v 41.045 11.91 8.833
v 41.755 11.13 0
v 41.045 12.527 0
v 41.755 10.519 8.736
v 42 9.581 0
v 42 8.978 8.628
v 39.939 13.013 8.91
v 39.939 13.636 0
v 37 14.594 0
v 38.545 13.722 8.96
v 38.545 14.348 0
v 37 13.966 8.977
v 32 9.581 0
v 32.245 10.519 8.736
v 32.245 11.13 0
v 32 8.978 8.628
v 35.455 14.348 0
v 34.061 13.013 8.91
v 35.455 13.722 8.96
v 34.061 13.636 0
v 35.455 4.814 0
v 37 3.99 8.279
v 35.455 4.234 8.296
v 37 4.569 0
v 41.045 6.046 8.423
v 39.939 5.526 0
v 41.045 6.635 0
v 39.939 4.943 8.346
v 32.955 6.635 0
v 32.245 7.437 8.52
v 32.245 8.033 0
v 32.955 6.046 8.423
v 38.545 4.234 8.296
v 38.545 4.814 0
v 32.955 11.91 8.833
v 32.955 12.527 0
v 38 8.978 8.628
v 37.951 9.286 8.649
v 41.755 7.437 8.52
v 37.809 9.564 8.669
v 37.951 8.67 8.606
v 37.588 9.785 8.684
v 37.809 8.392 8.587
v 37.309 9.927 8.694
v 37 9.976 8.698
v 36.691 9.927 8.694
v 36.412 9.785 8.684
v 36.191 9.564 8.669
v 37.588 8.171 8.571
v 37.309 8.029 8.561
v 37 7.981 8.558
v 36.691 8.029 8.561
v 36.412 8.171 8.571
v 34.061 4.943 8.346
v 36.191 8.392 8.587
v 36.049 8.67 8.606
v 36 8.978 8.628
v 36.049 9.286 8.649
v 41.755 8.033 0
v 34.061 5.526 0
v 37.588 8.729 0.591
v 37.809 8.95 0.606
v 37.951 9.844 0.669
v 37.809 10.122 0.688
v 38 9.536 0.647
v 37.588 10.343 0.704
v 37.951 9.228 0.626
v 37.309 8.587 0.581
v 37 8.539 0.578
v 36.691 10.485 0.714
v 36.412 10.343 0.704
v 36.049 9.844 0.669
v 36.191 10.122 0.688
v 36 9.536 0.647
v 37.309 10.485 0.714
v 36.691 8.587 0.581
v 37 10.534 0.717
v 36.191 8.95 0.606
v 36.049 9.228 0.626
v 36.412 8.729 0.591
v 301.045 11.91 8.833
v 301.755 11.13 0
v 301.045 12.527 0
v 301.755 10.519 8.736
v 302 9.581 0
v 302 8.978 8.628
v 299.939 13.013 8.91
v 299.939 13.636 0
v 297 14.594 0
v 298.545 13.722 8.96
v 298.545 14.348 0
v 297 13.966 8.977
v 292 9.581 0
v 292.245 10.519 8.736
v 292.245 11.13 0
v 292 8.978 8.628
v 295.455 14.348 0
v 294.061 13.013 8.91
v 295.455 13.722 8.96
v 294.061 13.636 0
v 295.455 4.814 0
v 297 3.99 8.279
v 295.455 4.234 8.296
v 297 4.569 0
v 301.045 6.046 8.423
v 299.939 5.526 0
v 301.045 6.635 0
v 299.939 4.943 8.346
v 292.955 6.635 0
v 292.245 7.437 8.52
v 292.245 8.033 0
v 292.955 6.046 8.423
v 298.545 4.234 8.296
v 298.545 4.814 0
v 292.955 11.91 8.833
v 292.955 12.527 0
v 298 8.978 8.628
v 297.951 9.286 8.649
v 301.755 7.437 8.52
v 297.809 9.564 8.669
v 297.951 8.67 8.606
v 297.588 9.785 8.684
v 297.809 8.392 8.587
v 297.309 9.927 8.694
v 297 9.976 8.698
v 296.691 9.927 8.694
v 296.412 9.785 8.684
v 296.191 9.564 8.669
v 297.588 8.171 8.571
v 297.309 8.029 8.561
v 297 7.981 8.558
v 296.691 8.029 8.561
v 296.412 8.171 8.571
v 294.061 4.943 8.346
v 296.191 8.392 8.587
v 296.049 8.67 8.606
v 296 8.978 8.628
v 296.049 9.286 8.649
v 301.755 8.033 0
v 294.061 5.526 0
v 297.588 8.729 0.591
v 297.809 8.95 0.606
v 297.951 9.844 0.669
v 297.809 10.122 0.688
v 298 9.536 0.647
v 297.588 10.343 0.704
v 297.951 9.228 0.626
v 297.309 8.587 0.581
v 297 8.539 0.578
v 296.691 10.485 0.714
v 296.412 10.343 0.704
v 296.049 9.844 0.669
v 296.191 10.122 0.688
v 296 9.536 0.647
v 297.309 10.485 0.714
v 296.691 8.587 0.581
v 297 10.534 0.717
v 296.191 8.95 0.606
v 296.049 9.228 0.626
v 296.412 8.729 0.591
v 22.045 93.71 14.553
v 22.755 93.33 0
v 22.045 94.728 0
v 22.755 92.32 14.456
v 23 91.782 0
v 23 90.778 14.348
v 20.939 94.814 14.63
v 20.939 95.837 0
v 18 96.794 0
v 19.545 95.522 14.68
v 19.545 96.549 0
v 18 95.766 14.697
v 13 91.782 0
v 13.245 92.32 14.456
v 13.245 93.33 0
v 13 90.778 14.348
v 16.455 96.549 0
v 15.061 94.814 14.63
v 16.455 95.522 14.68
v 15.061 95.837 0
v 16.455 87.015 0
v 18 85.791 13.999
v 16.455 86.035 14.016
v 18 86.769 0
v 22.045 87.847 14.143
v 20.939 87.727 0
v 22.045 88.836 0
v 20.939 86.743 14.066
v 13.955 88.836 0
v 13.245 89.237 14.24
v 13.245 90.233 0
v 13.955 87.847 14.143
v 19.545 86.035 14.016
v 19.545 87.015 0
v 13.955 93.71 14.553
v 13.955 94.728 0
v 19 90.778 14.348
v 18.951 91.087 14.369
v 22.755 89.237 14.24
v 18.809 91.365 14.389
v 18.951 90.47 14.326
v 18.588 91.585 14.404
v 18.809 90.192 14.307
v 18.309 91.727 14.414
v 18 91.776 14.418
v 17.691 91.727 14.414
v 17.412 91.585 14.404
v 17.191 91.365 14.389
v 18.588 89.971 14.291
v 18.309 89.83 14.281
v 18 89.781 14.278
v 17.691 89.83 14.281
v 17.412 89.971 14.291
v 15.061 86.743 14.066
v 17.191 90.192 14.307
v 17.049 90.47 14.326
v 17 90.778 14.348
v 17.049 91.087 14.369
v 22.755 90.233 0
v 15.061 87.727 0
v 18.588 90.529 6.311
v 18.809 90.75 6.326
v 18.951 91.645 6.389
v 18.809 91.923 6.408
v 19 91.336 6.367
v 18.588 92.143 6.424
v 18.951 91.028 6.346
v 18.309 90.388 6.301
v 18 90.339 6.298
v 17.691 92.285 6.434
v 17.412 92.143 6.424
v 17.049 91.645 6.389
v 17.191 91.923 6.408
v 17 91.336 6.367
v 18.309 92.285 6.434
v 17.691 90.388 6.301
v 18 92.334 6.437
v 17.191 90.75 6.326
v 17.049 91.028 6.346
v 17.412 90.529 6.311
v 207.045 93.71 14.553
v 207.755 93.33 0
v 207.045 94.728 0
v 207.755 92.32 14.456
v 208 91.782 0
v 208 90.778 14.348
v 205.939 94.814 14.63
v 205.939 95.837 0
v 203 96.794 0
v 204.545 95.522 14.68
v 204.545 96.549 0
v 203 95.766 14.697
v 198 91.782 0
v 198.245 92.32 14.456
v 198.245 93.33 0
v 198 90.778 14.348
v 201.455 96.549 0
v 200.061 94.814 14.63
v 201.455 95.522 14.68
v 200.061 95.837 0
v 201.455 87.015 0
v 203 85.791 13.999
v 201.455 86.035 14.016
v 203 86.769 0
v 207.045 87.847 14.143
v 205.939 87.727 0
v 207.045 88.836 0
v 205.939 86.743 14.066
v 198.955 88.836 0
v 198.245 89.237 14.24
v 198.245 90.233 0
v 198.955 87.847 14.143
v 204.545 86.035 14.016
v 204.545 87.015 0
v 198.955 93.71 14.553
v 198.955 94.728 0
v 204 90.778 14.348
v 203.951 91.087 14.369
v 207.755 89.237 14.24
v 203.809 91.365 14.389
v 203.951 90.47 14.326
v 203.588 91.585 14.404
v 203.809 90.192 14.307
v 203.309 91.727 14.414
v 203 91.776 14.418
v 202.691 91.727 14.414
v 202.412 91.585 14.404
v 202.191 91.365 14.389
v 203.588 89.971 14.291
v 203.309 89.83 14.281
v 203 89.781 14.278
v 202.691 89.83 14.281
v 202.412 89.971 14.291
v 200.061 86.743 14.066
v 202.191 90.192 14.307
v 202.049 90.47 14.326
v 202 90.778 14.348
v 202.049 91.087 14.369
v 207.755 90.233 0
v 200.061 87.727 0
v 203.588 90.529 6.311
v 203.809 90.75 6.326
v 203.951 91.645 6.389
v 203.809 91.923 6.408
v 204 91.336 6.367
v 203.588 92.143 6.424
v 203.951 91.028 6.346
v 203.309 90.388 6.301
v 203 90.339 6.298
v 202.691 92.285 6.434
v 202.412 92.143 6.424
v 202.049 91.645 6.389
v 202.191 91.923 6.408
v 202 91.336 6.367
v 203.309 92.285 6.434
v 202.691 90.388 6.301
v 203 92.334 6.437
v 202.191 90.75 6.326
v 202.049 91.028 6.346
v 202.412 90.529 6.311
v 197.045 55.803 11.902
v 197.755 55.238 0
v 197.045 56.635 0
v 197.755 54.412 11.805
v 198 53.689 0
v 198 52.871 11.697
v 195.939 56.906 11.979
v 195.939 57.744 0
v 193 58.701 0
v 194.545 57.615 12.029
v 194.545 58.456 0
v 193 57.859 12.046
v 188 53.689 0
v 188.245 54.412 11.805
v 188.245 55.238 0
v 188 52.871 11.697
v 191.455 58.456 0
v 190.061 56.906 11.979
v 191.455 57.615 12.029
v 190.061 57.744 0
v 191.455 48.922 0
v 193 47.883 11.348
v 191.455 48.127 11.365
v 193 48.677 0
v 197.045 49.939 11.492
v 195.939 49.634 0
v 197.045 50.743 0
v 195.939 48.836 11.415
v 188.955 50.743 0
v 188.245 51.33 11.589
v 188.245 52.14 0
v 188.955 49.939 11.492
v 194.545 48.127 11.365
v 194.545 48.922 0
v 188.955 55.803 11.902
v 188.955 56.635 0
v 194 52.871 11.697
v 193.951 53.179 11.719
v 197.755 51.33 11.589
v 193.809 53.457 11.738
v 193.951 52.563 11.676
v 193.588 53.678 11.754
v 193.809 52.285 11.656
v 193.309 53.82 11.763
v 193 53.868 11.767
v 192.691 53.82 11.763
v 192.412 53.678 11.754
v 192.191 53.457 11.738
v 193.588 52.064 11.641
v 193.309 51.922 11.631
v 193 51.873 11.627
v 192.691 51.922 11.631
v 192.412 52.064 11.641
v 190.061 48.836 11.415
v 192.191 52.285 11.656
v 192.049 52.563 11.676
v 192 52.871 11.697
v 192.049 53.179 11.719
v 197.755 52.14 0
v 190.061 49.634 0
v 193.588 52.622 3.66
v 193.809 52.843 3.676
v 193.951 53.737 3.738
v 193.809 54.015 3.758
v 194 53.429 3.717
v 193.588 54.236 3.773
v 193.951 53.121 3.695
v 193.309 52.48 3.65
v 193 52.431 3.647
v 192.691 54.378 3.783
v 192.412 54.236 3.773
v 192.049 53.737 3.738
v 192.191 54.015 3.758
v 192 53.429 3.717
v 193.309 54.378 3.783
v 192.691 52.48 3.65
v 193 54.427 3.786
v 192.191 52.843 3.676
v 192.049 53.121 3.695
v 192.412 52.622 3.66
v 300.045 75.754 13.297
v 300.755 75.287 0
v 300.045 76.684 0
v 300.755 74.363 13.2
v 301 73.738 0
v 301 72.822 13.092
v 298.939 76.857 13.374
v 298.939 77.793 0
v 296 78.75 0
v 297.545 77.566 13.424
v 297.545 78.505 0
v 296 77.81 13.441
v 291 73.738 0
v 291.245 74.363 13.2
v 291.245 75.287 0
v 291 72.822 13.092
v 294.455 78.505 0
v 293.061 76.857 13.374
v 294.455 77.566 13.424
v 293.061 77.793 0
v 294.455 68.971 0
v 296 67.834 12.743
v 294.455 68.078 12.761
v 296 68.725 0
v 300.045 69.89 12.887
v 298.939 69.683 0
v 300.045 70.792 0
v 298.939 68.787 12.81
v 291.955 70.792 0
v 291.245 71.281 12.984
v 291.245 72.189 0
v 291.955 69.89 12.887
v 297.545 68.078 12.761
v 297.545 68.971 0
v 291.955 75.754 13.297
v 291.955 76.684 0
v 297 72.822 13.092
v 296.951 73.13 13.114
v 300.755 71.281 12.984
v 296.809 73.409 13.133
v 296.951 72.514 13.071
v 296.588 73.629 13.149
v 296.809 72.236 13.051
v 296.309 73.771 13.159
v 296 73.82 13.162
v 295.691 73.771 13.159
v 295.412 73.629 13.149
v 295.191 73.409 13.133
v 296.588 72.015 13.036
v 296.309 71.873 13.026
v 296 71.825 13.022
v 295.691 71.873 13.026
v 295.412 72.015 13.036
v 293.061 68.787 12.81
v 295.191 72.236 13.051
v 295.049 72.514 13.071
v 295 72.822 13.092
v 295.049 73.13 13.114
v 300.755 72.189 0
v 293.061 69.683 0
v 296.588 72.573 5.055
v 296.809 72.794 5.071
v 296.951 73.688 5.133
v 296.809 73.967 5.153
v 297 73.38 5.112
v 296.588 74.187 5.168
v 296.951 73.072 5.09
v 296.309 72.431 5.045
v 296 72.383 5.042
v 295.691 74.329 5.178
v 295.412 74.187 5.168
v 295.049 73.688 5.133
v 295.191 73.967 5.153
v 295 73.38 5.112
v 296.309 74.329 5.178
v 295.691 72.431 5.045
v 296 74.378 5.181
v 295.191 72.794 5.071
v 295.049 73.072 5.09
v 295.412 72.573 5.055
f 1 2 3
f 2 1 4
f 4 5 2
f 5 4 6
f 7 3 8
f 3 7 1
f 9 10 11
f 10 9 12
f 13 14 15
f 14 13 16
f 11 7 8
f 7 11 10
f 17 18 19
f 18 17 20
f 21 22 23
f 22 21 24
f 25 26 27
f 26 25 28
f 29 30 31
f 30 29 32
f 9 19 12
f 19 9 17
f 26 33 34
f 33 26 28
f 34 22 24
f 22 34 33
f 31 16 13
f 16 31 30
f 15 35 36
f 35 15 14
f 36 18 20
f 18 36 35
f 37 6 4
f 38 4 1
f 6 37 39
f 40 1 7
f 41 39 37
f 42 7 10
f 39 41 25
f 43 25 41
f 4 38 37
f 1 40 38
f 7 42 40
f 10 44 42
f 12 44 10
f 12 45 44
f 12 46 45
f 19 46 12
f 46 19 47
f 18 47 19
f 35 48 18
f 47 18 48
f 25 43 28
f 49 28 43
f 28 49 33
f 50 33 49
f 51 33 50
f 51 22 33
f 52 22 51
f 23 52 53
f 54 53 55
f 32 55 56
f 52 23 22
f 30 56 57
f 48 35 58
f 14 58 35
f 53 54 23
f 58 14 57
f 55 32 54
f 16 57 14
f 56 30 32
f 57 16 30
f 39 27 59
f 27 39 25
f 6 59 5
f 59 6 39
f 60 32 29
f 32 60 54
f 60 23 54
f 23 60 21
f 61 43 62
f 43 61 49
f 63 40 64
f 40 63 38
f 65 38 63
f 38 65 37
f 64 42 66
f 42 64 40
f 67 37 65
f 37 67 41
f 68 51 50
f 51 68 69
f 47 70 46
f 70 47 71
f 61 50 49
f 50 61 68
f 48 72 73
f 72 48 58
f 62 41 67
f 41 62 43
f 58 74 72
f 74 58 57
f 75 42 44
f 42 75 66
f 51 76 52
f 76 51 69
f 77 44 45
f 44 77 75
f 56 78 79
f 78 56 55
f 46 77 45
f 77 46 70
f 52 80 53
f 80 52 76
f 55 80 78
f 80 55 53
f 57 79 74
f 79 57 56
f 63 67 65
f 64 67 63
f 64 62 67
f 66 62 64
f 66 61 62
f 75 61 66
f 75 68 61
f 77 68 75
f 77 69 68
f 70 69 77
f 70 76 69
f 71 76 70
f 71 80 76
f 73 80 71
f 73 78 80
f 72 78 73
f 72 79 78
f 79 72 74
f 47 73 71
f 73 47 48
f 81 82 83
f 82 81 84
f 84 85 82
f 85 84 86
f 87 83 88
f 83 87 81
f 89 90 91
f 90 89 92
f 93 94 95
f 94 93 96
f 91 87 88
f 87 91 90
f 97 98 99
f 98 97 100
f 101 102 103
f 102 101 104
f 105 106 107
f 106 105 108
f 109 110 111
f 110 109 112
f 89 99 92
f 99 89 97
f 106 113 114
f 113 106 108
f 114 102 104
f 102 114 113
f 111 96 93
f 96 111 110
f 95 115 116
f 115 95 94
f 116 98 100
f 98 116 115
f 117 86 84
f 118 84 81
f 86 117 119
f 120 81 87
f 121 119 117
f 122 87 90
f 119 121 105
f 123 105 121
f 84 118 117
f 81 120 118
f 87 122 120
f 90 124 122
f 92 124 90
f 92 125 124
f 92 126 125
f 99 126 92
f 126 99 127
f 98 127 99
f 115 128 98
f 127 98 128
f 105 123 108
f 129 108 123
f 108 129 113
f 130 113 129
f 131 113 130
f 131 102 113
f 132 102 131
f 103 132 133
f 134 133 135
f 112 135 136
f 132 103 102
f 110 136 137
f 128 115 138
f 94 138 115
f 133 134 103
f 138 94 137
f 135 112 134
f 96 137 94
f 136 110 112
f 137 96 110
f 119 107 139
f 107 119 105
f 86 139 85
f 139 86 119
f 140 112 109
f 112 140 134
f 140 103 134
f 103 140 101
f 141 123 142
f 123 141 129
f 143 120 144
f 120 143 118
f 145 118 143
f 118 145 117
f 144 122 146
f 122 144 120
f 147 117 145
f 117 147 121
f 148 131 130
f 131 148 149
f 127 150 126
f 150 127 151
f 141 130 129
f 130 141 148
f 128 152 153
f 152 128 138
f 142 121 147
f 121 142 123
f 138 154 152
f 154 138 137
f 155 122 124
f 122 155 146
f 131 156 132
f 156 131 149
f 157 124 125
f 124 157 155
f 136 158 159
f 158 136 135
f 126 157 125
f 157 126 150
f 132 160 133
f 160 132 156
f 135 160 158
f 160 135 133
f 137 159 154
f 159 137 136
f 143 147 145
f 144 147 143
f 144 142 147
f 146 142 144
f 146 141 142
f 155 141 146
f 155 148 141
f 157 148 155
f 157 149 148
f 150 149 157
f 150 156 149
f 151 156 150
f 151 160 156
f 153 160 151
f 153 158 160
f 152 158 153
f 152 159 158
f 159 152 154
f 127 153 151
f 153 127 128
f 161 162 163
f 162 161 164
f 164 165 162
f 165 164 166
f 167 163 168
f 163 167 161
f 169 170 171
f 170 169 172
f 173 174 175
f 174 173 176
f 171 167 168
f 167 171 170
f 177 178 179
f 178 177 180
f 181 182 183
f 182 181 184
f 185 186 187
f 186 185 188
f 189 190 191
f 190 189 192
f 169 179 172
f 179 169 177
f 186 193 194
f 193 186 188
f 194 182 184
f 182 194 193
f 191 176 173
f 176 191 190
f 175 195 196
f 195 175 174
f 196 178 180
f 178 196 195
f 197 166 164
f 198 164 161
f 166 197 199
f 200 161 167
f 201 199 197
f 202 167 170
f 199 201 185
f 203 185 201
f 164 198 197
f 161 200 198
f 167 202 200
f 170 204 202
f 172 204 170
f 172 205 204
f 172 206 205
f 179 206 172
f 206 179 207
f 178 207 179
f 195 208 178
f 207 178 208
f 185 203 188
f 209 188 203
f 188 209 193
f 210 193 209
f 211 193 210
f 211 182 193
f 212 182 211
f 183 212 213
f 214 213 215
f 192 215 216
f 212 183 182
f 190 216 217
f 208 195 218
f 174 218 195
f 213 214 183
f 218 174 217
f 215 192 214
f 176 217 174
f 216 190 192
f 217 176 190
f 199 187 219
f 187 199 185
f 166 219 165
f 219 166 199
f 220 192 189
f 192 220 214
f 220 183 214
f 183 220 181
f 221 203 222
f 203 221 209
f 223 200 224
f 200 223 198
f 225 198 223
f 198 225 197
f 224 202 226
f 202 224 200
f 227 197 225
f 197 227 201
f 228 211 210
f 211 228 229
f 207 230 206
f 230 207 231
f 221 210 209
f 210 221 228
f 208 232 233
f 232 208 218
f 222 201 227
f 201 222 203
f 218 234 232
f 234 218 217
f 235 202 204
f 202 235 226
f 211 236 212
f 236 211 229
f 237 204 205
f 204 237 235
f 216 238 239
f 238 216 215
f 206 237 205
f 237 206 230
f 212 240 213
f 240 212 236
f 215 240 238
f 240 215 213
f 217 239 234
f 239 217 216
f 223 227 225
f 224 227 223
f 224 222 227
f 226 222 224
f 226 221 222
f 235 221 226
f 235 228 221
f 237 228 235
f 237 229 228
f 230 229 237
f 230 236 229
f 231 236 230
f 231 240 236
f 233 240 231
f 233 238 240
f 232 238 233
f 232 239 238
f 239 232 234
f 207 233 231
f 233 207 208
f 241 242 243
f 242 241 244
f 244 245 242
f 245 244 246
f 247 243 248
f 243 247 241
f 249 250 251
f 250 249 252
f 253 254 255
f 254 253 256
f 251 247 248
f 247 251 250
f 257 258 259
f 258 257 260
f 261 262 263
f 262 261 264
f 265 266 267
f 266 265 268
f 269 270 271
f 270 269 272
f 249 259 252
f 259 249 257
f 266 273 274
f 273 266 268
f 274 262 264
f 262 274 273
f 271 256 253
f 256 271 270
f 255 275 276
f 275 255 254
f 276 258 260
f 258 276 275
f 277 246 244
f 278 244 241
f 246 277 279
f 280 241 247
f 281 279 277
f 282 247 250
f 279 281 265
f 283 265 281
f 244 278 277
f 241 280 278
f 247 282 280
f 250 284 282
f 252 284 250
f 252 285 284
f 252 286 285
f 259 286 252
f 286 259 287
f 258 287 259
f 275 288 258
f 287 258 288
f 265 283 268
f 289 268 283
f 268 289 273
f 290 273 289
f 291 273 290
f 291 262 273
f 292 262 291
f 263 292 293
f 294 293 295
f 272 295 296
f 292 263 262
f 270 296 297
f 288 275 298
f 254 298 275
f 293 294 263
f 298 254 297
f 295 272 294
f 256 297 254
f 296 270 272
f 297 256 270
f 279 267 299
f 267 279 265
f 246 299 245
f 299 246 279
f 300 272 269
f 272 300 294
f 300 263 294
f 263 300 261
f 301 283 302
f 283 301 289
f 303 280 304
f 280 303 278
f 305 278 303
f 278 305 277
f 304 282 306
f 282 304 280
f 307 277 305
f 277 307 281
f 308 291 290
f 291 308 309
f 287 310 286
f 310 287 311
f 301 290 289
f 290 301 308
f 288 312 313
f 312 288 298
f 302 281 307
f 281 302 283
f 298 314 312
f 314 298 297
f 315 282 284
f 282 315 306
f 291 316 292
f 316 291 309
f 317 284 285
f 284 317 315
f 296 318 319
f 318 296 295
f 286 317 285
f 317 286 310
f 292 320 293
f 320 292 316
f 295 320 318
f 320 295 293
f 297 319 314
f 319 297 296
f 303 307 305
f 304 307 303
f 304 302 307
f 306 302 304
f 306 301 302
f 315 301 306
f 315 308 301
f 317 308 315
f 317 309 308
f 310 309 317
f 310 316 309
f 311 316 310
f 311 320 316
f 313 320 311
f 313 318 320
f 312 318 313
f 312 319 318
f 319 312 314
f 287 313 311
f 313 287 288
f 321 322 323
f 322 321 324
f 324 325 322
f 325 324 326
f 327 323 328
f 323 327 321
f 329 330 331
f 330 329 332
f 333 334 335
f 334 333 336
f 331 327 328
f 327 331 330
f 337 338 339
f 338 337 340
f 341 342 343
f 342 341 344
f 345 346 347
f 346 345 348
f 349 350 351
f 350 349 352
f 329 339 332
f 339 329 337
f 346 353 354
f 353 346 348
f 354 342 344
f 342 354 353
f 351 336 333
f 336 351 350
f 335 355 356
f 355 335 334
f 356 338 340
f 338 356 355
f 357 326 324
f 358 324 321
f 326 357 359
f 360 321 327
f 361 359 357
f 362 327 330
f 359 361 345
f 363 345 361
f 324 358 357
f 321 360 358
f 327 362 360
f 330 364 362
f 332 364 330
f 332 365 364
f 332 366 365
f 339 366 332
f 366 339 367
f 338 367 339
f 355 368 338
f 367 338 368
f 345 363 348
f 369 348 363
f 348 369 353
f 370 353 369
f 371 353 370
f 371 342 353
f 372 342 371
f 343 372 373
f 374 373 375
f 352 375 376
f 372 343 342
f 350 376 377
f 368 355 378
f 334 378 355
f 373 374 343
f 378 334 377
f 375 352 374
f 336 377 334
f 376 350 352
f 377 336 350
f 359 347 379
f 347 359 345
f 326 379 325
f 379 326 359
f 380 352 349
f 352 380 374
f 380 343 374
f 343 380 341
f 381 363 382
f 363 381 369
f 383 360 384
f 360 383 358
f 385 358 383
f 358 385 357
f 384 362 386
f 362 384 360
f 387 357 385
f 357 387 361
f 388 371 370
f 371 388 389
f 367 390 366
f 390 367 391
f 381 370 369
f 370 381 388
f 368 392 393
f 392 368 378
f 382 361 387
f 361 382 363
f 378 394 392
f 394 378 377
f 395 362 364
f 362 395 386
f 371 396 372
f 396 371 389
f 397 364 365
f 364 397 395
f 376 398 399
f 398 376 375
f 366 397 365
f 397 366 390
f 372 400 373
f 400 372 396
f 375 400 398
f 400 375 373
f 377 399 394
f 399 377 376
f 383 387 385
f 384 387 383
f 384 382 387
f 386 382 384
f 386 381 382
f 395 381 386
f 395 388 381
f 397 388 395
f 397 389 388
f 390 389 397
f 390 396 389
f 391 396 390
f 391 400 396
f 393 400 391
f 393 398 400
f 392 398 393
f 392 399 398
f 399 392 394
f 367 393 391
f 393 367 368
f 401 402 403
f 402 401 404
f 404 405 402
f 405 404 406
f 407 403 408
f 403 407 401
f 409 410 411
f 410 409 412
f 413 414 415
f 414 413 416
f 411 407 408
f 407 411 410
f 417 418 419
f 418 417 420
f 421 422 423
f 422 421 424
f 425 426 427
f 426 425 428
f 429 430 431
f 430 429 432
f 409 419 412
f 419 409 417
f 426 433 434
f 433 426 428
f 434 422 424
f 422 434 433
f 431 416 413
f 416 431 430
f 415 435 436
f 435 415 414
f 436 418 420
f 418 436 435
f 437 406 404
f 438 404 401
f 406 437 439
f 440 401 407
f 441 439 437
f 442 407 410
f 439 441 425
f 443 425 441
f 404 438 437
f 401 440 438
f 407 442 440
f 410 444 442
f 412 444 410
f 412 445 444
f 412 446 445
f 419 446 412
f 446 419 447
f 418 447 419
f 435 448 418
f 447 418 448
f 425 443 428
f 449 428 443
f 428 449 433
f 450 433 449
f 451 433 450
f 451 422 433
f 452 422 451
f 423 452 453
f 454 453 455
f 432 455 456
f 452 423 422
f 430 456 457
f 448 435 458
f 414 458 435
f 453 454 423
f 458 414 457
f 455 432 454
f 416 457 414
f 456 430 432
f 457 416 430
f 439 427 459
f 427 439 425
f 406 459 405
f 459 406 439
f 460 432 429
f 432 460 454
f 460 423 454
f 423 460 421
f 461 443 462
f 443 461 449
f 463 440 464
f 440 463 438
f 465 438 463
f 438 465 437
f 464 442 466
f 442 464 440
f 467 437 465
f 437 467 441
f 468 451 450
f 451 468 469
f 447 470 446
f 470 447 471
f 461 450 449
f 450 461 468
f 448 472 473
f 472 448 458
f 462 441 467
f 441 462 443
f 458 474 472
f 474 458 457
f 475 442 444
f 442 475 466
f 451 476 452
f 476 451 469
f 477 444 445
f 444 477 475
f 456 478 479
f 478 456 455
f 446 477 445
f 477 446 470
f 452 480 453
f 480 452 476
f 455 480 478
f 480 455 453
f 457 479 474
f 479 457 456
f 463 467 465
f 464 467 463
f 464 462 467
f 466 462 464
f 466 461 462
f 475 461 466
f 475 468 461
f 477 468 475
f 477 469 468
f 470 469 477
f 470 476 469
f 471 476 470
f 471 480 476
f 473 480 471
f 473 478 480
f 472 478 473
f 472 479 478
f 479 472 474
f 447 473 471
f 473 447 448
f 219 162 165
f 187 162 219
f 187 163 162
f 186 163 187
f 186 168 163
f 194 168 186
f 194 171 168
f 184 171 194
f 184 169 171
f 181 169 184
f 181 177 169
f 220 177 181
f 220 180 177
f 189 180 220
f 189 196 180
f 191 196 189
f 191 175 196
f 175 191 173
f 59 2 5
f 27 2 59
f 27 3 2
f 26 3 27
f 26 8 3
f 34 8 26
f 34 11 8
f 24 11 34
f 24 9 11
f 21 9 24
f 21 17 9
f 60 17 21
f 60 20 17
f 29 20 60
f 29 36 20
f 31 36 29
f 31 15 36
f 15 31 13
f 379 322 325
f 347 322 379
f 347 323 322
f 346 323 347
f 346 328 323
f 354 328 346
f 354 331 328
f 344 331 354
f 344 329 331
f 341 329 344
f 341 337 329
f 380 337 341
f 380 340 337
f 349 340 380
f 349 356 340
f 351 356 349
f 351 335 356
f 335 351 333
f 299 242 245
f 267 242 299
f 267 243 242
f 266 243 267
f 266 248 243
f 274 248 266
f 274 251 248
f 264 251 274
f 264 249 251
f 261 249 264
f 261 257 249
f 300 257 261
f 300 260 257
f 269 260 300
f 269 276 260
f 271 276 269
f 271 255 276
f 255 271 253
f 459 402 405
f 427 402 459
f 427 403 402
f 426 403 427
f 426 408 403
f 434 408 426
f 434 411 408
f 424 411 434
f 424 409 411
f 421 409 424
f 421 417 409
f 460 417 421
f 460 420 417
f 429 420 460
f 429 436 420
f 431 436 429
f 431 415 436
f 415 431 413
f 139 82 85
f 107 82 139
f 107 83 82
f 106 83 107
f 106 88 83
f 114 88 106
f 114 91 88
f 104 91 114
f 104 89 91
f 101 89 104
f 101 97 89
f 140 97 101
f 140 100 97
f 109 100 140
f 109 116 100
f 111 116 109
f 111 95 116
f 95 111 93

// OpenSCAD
// translate([0,0,-10])
// 	cube([30,10,10]);

screwhole_length = 9;
leg_radius = 5;
hole_radius = 1;

module leg(x,y){
	translate([x,y,-20])
		difference() {
			cylinder(20, leg_radius, leg_radius, $fn=20);
			translate([0,0,20- screwhole_length + 1]) // holes for screws
				cylinder(screwhole_length, hole_radius, hole_radius, $fn=20);
		}
}

difference() {
translate([0,0,8]) {
	rotate([4,0,0]){
			// cube([320,100,10]); // top plate, used mainly for debugging

		leg(37,9);
		leg(320-23,9);
		leg(18,100-9);
		leg(18,100-9);
		leg(320-117,100-9);
		leg(320-127,100-47);
		leg(320-24,100-27);
	};
};
translate([0,0,-20])
		cube([320,100,20]); // ground for difference
};
